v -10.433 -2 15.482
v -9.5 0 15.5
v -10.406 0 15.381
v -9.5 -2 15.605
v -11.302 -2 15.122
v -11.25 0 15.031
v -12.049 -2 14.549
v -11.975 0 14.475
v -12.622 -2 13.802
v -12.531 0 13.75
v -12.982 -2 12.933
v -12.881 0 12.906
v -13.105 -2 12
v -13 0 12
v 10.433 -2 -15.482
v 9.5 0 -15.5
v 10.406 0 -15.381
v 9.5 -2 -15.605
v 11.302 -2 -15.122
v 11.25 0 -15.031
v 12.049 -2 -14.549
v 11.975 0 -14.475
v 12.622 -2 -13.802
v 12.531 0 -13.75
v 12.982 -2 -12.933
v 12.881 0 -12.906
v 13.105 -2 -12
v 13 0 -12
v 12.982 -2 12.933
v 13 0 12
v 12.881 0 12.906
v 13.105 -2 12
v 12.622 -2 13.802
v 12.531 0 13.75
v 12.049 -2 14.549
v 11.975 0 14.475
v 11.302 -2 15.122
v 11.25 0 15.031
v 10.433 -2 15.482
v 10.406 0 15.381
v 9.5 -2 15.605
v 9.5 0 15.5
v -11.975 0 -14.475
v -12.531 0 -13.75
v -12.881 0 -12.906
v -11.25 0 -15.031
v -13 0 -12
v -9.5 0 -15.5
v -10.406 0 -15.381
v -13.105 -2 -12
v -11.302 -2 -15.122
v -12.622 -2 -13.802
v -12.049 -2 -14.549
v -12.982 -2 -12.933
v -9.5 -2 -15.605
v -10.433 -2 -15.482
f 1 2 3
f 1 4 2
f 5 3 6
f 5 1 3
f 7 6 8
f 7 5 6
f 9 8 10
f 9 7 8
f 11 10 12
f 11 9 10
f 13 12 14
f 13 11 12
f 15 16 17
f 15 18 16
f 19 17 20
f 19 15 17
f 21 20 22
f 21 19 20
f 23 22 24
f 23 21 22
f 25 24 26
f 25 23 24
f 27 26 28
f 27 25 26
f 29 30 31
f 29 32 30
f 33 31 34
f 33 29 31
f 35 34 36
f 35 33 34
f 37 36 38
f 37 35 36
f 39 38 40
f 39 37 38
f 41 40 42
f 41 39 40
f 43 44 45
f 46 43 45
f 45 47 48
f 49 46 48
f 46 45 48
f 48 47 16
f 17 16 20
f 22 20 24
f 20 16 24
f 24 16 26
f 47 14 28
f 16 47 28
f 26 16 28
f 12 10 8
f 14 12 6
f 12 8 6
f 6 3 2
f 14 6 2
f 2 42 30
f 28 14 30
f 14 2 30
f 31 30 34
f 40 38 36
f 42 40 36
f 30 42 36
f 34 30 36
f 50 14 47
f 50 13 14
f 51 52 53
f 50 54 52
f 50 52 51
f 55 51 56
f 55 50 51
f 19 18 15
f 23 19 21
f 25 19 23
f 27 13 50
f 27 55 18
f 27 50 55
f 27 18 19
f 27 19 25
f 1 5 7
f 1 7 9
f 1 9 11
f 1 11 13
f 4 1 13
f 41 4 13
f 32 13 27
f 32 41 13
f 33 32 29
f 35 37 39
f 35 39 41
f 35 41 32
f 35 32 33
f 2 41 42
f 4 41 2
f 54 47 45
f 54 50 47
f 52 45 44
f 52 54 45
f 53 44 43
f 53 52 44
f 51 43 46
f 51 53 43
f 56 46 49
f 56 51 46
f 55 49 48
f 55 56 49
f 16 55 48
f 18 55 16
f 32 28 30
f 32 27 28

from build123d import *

# Parameters (mm, degrees)
F1_DEPTH = 2
F1_TAPER = -3


with BuildPart() as f1:
    # F0 (on Front) → F1 (new body)
    with BuildSketch(Plane.XZ):
        with BuildLine():
            ThreePointArc((13, 12), (11.9748737342, 14.4748737342), (9.5, 15.5))
            Line((9.5, 15.5), (-9.5, 15.5))
            ThreePointArc((-9.5, 15.5), (-11.9748737342, 14.4748737342), (-13, 12))
            Line((-13, 12), (-13, -12))
            ThreePointArc((-13, -12), (-11.9748737342, -14.4748737342), (-9.5, -15.5))
            Line((-9.5, -15.5), (9.5, -15.5))
            ThreePointArc((9.5, -15.5), (11.9748737342, -14.4748737342), (13, -12))
            Line((13, -12), (13, 12))
        make_face()
    extrude(amount=F1_DEPTH, taper=F1_TAPER)


solid = f1.part
